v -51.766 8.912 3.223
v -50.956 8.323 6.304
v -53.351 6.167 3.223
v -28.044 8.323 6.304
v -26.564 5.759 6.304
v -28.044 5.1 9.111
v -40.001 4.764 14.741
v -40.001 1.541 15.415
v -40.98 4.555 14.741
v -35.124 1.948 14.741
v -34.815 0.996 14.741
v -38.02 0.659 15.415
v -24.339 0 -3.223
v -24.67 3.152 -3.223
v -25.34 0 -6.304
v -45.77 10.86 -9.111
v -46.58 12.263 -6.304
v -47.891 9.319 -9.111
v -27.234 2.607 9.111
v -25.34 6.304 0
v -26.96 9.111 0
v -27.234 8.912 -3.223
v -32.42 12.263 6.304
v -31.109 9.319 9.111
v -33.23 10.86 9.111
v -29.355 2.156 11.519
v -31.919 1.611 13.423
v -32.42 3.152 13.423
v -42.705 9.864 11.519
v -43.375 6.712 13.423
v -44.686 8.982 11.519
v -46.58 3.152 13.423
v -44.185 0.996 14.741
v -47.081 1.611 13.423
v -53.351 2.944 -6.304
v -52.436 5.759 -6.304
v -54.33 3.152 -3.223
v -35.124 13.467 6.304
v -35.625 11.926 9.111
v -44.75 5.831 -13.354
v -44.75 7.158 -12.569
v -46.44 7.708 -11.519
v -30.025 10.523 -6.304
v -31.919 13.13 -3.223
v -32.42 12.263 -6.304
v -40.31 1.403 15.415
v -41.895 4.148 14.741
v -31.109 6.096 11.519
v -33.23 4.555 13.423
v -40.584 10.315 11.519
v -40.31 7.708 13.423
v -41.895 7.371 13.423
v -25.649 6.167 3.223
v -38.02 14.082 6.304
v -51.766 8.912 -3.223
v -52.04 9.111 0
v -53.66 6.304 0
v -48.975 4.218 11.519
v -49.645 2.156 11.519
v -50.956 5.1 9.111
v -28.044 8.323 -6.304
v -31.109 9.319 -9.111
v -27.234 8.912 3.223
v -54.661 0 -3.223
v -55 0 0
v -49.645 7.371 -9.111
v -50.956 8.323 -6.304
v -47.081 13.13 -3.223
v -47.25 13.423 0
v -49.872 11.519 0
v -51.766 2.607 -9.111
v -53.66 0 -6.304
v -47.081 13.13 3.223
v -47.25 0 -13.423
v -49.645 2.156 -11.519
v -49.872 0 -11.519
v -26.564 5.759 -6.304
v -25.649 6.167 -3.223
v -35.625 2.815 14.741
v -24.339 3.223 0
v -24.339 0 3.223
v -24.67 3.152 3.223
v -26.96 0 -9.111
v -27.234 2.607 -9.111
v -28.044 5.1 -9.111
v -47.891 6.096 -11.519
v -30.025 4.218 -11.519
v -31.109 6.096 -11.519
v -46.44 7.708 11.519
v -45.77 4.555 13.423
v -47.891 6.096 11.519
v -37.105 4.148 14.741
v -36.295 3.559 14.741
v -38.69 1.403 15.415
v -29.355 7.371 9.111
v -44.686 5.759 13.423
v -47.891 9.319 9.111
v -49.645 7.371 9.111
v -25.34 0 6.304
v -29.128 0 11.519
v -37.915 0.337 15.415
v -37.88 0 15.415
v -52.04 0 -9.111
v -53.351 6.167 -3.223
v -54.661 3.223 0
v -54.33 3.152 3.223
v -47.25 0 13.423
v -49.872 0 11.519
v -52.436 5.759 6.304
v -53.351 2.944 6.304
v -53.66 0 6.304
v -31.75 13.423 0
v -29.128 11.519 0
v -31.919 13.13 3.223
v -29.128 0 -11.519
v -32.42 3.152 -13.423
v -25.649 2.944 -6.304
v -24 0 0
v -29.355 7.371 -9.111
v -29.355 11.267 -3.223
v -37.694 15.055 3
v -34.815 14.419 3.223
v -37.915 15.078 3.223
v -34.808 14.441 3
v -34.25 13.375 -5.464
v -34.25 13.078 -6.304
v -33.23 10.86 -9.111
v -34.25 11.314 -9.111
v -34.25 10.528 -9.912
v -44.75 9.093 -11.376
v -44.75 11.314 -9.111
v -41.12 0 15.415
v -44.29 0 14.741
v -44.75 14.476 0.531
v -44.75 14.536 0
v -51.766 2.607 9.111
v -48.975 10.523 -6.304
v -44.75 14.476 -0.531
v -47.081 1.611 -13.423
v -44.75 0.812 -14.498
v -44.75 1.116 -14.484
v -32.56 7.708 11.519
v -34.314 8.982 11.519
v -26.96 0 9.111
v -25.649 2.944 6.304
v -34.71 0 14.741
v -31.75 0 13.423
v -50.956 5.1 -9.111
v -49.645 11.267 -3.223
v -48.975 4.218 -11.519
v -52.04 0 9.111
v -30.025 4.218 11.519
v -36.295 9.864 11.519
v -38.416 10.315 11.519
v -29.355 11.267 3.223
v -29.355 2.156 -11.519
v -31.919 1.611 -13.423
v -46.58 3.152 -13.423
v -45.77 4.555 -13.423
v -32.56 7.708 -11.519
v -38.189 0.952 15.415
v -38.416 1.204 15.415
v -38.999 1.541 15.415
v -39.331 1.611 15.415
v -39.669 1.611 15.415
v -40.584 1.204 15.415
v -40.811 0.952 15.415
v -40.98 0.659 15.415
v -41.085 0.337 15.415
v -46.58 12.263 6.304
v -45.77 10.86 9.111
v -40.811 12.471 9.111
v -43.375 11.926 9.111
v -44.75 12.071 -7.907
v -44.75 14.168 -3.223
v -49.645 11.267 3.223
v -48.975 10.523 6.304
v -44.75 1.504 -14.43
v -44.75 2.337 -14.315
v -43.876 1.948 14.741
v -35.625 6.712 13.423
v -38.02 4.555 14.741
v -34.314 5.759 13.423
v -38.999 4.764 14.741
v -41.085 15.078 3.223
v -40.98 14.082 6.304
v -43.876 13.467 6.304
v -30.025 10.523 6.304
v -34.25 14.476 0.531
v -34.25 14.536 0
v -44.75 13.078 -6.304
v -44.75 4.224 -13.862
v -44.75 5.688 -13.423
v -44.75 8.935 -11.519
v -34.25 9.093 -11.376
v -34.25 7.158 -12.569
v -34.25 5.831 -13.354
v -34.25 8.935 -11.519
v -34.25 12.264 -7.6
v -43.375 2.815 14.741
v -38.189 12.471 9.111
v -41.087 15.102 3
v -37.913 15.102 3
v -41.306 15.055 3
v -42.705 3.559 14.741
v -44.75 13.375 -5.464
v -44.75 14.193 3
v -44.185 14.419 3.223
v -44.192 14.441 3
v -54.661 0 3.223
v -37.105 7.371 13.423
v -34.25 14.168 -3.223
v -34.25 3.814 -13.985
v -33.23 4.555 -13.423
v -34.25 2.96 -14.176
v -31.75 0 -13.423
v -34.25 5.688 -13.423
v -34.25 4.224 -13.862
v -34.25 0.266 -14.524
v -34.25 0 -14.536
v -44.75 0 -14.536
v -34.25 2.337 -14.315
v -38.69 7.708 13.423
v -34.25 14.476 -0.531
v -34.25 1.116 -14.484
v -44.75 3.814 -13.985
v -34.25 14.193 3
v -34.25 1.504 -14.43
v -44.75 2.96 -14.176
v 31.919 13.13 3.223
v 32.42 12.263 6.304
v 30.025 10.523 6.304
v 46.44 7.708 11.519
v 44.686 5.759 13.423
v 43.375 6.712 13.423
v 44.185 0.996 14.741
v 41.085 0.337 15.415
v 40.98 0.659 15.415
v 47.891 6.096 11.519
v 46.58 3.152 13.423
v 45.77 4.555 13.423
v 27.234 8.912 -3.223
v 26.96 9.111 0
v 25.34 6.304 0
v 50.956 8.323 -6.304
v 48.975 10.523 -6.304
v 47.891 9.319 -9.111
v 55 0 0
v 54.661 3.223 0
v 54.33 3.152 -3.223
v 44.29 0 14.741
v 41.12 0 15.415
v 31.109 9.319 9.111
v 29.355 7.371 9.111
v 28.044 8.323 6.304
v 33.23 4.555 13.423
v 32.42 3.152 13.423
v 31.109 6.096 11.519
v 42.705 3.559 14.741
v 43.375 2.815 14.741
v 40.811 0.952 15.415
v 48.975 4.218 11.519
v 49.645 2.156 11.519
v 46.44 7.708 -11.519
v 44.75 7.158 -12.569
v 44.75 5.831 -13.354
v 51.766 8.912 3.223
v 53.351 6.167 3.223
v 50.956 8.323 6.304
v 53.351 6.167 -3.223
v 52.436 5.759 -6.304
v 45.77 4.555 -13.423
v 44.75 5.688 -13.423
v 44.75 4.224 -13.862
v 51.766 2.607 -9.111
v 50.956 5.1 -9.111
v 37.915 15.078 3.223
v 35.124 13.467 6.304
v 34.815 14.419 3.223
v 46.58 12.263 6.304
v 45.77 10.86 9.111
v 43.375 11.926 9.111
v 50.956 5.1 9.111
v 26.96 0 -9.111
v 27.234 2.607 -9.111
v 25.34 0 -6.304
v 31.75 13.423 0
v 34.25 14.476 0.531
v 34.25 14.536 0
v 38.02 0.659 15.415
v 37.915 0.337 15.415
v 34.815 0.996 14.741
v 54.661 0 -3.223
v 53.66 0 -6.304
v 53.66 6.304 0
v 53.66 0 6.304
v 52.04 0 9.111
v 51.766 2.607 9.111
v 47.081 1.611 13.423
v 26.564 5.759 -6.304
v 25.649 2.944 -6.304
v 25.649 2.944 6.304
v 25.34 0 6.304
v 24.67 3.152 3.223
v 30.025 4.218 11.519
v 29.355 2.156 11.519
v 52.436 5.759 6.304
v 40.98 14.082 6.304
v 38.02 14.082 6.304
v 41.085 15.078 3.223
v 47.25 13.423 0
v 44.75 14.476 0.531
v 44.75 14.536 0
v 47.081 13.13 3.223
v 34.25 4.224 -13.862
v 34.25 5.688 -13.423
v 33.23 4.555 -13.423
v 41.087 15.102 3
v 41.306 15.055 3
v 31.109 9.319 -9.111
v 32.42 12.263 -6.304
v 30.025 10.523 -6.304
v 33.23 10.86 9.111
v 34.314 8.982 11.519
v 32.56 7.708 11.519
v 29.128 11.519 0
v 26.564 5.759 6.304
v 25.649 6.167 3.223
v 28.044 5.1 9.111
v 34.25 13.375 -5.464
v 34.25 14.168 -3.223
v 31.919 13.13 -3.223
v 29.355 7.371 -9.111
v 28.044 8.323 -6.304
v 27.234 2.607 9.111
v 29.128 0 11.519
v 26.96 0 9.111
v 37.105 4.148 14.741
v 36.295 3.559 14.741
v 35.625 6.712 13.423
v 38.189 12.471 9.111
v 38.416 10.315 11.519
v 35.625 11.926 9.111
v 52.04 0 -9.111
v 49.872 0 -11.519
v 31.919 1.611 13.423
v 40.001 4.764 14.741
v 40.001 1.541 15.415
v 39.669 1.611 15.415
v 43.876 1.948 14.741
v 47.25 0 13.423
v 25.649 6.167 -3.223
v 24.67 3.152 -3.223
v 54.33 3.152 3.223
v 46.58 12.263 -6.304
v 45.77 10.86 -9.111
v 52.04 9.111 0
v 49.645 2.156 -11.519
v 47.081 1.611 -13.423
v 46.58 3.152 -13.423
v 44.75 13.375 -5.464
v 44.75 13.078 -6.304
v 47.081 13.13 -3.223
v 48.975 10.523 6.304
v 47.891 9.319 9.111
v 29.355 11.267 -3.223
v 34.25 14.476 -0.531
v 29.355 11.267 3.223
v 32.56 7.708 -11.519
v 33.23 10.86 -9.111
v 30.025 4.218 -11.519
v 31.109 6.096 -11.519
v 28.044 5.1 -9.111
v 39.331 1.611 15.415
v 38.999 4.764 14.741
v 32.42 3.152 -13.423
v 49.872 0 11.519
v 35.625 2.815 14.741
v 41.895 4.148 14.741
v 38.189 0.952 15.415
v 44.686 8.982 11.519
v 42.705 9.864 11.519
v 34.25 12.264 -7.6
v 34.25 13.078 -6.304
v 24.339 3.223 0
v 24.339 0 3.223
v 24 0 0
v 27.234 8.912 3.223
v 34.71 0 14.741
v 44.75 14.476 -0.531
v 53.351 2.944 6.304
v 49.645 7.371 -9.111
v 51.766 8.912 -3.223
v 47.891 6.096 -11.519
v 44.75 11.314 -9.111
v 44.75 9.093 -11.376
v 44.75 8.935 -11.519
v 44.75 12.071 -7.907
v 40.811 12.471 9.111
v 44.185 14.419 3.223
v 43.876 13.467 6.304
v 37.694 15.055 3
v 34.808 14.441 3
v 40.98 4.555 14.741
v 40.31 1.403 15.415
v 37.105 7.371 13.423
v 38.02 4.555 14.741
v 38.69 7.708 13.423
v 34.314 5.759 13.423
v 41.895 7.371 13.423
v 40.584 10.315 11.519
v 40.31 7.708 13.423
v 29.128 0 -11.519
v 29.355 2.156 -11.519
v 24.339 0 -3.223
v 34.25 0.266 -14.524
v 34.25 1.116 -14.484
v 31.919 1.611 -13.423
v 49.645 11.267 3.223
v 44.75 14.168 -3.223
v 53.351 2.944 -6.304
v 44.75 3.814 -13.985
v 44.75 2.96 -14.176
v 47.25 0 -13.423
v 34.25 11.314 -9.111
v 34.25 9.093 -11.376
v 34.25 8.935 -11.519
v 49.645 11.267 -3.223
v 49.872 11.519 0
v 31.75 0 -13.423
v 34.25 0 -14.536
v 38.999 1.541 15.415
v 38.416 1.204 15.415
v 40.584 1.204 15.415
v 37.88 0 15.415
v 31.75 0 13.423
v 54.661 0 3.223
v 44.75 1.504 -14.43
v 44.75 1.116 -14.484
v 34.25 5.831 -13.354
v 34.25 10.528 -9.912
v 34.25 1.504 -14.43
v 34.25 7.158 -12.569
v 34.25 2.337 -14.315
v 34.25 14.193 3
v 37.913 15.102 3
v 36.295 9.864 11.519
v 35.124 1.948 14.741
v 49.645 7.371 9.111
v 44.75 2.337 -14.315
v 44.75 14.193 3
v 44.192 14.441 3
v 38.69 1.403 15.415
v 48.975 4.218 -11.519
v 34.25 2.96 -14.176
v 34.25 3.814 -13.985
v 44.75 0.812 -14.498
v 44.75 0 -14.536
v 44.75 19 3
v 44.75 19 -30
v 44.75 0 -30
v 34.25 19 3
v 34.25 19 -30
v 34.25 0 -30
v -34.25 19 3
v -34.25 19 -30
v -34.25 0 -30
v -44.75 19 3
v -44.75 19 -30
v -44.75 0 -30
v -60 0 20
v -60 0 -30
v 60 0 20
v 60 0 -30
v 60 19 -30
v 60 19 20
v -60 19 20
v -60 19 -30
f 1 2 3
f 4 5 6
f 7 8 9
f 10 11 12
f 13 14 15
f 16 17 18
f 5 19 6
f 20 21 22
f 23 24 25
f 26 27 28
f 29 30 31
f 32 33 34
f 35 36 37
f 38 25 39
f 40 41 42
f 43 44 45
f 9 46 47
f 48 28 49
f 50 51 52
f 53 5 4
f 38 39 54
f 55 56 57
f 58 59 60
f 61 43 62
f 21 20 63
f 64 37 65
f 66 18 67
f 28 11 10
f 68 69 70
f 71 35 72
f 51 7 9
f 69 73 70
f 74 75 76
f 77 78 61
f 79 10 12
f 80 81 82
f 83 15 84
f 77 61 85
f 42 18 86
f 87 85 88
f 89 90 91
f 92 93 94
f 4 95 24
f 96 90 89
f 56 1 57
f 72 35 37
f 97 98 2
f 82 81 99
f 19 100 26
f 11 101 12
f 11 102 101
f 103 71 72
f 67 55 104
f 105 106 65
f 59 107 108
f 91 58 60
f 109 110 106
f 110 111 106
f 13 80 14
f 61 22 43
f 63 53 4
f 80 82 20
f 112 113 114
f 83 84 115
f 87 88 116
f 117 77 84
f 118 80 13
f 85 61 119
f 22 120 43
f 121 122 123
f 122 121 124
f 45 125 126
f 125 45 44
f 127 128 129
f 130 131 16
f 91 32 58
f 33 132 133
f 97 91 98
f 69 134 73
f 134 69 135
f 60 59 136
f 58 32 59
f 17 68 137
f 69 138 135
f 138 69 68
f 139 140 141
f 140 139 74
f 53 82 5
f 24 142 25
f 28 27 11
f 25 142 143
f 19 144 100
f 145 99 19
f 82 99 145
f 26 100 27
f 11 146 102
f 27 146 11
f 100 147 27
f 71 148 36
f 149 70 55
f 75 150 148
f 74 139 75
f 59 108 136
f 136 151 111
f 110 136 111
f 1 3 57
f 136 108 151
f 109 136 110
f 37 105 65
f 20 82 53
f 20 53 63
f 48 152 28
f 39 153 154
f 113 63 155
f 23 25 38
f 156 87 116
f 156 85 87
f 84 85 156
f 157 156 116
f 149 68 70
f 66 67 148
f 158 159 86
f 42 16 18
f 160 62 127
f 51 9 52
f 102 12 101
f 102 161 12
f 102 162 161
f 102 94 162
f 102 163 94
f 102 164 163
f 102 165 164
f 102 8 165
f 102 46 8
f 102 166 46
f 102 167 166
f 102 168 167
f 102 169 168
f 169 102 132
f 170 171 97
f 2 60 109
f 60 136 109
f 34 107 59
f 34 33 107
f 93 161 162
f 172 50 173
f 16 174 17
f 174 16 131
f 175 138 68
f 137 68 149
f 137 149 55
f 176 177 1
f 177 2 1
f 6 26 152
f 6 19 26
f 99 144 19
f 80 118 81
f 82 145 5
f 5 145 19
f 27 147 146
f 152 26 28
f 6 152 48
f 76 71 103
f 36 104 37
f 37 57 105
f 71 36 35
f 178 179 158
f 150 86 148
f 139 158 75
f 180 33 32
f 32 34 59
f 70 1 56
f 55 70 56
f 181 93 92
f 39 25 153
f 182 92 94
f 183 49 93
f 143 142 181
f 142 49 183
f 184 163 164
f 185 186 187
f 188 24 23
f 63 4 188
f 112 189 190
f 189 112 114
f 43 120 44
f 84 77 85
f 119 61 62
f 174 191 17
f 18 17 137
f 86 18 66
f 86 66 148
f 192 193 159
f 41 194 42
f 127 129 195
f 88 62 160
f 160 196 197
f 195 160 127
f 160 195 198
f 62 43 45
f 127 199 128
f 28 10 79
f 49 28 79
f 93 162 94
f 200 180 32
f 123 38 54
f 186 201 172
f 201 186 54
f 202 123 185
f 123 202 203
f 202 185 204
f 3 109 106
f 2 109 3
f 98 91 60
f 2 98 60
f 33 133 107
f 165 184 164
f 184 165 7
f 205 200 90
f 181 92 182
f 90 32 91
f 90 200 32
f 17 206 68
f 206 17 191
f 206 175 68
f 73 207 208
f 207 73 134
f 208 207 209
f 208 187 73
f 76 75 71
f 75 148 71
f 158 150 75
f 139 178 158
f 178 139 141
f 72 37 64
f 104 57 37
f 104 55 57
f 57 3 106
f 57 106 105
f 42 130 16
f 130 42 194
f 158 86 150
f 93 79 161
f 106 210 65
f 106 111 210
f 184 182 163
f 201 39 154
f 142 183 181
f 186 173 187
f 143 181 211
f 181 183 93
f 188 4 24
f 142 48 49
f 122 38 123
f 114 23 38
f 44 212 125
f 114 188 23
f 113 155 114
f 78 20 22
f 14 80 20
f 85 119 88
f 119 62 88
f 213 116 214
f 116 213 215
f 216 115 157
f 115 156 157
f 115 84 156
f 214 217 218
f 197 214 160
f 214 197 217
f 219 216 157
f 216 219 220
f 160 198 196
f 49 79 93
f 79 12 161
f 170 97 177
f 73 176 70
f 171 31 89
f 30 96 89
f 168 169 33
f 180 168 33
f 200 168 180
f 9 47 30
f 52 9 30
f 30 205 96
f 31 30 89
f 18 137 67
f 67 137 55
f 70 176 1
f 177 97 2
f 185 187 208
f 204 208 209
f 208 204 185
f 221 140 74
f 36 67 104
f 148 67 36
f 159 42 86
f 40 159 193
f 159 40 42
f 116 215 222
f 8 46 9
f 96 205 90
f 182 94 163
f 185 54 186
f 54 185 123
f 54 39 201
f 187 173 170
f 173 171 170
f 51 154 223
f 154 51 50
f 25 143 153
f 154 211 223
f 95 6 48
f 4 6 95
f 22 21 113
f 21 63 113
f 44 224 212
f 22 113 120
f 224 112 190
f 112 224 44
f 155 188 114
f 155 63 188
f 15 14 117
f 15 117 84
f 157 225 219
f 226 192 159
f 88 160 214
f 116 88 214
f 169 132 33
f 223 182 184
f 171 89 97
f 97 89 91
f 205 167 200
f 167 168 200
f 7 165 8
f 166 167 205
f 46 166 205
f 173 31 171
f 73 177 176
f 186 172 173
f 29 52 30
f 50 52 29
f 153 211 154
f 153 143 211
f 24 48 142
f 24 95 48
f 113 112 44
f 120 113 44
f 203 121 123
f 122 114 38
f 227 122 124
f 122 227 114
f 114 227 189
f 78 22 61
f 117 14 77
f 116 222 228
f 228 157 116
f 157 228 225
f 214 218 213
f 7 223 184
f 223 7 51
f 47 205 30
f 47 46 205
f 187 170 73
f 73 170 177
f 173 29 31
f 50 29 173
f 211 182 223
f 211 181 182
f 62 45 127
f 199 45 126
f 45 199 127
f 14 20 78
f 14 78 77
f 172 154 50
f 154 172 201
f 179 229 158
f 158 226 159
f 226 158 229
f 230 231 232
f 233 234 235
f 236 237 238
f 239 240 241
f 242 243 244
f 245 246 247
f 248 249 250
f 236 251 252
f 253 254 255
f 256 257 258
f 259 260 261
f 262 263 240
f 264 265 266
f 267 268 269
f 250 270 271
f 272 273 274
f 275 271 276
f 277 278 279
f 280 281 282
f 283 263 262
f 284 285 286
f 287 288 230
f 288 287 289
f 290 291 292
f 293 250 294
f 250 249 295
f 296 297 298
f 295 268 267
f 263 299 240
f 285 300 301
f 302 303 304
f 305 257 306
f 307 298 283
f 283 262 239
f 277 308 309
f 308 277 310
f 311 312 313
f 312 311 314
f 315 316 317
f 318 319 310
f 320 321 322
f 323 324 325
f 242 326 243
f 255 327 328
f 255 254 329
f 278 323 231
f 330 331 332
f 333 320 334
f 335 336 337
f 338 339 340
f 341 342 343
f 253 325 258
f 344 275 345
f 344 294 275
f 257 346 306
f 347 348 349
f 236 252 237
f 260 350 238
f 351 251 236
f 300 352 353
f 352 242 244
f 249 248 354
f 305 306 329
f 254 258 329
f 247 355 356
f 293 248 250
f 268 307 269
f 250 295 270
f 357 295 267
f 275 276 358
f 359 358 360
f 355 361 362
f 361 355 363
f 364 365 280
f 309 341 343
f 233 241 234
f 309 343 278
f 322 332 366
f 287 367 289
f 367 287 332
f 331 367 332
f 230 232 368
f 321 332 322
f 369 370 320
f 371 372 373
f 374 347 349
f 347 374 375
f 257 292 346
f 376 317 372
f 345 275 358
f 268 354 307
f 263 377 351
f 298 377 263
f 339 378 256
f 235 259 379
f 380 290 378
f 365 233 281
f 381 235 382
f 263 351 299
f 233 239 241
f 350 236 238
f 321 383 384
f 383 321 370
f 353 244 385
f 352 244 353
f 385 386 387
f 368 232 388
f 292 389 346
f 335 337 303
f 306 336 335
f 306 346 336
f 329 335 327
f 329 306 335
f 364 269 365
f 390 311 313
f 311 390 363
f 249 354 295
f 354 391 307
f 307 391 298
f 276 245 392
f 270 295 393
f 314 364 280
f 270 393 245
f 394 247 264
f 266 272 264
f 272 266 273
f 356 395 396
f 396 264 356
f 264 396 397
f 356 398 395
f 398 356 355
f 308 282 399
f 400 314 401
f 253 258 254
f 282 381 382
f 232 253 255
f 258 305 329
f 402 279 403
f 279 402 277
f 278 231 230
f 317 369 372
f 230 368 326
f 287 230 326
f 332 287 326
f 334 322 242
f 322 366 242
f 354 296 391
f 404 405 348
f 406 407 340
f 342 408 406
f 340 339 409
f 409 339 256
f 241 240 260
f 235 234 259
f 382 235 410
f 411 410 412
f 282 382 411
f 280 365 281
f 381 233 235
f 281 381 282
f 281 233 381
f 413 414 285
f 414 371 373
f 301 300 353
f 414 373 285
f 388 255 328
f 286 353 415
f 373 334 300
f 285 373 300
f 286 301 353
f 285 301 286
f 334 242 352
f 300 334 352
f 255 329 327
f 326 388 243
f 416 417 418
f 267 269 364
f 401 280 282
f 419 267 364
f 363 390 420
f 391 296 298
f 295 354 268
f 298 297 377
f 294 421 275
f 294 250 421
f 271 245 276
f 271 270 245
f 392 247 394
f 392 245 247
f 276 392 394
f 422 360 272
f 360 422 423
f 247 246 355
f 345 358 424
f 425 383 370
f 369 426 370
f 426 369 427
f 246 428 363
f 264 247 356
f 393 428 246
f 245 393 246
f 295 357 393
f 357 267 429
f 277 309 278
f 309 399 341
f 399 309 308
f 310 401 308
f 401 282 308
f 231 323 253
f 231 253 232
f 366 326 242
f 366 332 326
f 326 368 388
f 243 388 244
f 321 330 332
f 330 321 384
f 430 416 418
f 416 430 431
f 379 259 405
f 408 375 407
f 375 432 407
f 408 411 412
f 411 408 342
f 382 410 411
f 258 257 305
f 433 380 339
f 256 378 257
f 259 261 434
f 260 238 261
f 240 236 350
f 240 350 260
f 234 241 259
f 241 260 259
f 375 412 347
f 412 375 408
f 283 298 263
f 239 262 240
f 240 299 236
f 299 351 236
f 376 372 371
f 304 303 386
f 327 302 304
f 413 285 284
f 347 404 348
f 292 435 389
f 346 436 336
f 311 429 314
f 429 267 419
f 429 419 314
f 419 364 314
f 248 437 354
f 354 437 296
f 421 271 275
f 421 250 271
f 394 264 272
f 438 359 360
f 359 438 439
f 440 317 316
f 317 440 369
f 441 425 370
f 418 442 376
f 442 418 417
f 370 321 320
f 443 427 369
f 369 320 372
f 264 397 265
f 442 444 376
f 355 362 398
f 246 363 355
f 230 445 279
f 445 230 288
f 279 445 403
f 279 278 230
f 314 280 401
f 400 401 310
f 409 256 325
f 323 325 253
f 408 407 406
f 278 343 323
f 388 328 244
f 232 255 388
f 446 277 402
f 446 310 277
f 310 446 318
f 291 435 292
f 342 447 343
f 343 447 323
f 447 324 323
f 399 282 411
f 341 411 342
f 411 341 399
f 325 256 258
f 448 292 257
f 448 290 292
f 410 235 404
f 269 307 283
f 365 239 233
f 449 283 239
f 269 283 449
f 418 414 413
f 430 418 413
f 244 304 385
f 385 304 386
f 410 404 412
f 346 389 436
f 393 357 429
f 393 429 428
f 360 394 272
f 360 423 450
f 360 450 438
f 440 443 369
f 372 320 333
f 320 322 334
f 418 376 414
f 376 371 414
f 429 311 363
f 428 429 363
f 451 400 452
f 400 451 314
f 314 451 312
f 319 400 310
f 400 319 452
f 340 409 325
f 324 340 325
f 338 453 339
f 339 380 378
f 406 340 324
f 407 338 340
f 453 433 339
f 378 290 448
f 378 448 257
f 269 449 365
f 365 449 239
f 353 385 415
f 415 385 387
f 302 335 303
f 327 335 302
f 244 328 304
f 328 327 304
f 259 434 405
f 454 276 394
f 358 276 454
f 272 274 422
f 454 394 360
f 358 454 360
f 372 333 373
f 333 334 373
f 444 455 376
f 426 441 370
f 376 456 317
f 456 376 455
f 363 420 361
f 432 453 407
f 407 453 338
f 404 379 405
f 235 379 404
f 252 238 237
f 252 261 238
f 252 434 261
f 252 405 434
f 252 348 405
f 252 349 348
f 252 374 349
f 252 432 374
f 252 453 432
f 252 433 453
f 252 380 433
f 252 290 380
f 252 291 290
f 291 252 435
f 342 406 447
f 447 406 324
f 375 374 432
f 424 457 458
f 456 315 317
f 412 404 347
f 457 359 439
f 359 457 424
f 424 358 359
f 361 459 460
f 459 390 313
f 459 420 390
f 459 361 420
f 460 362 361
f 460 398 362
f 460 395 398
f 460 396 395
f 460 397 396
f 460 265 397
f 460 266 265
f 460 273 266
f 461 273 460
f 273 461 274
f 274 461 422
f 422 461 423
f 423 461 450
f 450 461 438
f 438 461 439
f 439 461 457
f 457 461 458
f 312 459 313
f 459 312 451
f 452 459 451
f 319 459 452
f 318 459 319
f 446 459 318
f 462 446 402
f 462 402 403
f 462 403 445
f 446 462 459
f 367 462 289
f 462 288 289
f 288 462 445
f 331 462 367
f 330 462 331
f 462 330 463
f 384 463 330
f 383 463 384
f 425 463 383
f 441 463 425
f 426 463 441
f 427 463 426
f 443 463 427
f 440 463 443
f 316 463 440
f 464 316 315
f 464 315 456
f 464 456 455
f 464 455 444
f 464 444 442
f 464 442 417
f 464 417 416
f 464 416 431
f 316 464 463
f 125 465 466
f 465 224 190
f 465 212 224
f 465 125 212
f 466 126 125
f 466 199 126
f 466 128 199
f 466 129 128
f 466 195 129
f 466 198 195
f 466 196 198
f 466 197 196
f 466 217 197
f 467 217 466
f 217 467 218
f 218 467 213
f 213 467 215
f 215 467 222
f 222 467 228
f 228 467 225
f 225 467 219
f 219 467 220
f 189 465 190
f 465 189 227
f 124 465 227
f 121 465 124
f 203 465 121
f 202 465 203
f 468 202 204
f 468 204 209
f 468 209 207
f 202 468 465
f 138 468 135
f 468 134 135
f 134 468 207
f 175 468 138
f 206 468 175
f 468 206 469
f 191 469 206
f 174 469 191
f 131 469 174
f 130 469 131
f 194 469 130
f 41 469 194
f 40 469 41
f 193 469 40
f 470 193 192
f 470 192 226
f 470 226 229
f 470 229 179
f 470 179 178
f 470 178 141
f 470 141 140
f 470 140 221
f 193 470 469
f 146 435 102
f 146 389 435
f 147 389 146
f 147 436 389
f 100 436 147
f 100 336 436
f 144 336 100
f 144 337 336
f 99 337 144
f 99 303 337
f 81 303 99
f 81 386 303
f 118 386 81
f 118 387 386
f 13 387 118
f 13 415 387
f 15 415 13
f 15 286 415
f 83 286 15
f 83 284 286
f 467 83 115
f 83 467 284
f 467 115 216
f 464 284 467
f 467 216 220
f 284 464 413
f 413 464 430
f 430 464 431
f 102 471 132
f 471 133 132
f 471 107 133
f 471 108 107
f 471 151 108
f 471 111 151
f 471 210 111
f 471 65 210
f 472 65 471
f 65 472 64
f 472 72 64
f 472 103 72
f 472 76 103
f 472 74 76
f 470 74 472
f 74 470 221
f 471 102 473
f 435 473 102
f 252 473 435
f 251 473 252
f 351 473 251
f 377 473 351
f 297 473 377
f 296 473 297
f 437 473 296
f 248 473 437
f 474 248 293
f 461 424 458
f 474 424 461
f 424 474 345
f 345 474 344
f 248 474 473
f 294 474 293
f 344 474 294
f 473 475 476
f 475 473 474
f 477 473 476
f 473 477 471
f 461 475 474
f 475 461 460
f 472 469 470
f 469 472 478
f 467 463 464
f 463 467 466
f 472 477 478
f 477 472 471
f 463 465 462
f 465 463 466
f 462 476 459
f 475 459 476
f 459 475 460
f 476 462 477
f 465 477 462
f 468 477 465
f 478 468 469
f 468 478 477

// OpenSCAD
difference(){
translate([0,0,-5]){
    cube([120,38,50], true);
}
cutaway();
}

module cutaway() {
    
    translate([-39.5,0,0]) {
        sphere(15.5);  
    }

    translate([39.5,0,0]) {
        sphere(15.5);  
    }
    
    translate([39.5,5,-22]){
        cube([10.5,30,50], true);
    }

    translate([-39.5,5,-22]){
        cube([10.5,30,50], true);
    }
    
    
translate([0,-25,0]){
    cube([130, 50, 80], true);
}

}
